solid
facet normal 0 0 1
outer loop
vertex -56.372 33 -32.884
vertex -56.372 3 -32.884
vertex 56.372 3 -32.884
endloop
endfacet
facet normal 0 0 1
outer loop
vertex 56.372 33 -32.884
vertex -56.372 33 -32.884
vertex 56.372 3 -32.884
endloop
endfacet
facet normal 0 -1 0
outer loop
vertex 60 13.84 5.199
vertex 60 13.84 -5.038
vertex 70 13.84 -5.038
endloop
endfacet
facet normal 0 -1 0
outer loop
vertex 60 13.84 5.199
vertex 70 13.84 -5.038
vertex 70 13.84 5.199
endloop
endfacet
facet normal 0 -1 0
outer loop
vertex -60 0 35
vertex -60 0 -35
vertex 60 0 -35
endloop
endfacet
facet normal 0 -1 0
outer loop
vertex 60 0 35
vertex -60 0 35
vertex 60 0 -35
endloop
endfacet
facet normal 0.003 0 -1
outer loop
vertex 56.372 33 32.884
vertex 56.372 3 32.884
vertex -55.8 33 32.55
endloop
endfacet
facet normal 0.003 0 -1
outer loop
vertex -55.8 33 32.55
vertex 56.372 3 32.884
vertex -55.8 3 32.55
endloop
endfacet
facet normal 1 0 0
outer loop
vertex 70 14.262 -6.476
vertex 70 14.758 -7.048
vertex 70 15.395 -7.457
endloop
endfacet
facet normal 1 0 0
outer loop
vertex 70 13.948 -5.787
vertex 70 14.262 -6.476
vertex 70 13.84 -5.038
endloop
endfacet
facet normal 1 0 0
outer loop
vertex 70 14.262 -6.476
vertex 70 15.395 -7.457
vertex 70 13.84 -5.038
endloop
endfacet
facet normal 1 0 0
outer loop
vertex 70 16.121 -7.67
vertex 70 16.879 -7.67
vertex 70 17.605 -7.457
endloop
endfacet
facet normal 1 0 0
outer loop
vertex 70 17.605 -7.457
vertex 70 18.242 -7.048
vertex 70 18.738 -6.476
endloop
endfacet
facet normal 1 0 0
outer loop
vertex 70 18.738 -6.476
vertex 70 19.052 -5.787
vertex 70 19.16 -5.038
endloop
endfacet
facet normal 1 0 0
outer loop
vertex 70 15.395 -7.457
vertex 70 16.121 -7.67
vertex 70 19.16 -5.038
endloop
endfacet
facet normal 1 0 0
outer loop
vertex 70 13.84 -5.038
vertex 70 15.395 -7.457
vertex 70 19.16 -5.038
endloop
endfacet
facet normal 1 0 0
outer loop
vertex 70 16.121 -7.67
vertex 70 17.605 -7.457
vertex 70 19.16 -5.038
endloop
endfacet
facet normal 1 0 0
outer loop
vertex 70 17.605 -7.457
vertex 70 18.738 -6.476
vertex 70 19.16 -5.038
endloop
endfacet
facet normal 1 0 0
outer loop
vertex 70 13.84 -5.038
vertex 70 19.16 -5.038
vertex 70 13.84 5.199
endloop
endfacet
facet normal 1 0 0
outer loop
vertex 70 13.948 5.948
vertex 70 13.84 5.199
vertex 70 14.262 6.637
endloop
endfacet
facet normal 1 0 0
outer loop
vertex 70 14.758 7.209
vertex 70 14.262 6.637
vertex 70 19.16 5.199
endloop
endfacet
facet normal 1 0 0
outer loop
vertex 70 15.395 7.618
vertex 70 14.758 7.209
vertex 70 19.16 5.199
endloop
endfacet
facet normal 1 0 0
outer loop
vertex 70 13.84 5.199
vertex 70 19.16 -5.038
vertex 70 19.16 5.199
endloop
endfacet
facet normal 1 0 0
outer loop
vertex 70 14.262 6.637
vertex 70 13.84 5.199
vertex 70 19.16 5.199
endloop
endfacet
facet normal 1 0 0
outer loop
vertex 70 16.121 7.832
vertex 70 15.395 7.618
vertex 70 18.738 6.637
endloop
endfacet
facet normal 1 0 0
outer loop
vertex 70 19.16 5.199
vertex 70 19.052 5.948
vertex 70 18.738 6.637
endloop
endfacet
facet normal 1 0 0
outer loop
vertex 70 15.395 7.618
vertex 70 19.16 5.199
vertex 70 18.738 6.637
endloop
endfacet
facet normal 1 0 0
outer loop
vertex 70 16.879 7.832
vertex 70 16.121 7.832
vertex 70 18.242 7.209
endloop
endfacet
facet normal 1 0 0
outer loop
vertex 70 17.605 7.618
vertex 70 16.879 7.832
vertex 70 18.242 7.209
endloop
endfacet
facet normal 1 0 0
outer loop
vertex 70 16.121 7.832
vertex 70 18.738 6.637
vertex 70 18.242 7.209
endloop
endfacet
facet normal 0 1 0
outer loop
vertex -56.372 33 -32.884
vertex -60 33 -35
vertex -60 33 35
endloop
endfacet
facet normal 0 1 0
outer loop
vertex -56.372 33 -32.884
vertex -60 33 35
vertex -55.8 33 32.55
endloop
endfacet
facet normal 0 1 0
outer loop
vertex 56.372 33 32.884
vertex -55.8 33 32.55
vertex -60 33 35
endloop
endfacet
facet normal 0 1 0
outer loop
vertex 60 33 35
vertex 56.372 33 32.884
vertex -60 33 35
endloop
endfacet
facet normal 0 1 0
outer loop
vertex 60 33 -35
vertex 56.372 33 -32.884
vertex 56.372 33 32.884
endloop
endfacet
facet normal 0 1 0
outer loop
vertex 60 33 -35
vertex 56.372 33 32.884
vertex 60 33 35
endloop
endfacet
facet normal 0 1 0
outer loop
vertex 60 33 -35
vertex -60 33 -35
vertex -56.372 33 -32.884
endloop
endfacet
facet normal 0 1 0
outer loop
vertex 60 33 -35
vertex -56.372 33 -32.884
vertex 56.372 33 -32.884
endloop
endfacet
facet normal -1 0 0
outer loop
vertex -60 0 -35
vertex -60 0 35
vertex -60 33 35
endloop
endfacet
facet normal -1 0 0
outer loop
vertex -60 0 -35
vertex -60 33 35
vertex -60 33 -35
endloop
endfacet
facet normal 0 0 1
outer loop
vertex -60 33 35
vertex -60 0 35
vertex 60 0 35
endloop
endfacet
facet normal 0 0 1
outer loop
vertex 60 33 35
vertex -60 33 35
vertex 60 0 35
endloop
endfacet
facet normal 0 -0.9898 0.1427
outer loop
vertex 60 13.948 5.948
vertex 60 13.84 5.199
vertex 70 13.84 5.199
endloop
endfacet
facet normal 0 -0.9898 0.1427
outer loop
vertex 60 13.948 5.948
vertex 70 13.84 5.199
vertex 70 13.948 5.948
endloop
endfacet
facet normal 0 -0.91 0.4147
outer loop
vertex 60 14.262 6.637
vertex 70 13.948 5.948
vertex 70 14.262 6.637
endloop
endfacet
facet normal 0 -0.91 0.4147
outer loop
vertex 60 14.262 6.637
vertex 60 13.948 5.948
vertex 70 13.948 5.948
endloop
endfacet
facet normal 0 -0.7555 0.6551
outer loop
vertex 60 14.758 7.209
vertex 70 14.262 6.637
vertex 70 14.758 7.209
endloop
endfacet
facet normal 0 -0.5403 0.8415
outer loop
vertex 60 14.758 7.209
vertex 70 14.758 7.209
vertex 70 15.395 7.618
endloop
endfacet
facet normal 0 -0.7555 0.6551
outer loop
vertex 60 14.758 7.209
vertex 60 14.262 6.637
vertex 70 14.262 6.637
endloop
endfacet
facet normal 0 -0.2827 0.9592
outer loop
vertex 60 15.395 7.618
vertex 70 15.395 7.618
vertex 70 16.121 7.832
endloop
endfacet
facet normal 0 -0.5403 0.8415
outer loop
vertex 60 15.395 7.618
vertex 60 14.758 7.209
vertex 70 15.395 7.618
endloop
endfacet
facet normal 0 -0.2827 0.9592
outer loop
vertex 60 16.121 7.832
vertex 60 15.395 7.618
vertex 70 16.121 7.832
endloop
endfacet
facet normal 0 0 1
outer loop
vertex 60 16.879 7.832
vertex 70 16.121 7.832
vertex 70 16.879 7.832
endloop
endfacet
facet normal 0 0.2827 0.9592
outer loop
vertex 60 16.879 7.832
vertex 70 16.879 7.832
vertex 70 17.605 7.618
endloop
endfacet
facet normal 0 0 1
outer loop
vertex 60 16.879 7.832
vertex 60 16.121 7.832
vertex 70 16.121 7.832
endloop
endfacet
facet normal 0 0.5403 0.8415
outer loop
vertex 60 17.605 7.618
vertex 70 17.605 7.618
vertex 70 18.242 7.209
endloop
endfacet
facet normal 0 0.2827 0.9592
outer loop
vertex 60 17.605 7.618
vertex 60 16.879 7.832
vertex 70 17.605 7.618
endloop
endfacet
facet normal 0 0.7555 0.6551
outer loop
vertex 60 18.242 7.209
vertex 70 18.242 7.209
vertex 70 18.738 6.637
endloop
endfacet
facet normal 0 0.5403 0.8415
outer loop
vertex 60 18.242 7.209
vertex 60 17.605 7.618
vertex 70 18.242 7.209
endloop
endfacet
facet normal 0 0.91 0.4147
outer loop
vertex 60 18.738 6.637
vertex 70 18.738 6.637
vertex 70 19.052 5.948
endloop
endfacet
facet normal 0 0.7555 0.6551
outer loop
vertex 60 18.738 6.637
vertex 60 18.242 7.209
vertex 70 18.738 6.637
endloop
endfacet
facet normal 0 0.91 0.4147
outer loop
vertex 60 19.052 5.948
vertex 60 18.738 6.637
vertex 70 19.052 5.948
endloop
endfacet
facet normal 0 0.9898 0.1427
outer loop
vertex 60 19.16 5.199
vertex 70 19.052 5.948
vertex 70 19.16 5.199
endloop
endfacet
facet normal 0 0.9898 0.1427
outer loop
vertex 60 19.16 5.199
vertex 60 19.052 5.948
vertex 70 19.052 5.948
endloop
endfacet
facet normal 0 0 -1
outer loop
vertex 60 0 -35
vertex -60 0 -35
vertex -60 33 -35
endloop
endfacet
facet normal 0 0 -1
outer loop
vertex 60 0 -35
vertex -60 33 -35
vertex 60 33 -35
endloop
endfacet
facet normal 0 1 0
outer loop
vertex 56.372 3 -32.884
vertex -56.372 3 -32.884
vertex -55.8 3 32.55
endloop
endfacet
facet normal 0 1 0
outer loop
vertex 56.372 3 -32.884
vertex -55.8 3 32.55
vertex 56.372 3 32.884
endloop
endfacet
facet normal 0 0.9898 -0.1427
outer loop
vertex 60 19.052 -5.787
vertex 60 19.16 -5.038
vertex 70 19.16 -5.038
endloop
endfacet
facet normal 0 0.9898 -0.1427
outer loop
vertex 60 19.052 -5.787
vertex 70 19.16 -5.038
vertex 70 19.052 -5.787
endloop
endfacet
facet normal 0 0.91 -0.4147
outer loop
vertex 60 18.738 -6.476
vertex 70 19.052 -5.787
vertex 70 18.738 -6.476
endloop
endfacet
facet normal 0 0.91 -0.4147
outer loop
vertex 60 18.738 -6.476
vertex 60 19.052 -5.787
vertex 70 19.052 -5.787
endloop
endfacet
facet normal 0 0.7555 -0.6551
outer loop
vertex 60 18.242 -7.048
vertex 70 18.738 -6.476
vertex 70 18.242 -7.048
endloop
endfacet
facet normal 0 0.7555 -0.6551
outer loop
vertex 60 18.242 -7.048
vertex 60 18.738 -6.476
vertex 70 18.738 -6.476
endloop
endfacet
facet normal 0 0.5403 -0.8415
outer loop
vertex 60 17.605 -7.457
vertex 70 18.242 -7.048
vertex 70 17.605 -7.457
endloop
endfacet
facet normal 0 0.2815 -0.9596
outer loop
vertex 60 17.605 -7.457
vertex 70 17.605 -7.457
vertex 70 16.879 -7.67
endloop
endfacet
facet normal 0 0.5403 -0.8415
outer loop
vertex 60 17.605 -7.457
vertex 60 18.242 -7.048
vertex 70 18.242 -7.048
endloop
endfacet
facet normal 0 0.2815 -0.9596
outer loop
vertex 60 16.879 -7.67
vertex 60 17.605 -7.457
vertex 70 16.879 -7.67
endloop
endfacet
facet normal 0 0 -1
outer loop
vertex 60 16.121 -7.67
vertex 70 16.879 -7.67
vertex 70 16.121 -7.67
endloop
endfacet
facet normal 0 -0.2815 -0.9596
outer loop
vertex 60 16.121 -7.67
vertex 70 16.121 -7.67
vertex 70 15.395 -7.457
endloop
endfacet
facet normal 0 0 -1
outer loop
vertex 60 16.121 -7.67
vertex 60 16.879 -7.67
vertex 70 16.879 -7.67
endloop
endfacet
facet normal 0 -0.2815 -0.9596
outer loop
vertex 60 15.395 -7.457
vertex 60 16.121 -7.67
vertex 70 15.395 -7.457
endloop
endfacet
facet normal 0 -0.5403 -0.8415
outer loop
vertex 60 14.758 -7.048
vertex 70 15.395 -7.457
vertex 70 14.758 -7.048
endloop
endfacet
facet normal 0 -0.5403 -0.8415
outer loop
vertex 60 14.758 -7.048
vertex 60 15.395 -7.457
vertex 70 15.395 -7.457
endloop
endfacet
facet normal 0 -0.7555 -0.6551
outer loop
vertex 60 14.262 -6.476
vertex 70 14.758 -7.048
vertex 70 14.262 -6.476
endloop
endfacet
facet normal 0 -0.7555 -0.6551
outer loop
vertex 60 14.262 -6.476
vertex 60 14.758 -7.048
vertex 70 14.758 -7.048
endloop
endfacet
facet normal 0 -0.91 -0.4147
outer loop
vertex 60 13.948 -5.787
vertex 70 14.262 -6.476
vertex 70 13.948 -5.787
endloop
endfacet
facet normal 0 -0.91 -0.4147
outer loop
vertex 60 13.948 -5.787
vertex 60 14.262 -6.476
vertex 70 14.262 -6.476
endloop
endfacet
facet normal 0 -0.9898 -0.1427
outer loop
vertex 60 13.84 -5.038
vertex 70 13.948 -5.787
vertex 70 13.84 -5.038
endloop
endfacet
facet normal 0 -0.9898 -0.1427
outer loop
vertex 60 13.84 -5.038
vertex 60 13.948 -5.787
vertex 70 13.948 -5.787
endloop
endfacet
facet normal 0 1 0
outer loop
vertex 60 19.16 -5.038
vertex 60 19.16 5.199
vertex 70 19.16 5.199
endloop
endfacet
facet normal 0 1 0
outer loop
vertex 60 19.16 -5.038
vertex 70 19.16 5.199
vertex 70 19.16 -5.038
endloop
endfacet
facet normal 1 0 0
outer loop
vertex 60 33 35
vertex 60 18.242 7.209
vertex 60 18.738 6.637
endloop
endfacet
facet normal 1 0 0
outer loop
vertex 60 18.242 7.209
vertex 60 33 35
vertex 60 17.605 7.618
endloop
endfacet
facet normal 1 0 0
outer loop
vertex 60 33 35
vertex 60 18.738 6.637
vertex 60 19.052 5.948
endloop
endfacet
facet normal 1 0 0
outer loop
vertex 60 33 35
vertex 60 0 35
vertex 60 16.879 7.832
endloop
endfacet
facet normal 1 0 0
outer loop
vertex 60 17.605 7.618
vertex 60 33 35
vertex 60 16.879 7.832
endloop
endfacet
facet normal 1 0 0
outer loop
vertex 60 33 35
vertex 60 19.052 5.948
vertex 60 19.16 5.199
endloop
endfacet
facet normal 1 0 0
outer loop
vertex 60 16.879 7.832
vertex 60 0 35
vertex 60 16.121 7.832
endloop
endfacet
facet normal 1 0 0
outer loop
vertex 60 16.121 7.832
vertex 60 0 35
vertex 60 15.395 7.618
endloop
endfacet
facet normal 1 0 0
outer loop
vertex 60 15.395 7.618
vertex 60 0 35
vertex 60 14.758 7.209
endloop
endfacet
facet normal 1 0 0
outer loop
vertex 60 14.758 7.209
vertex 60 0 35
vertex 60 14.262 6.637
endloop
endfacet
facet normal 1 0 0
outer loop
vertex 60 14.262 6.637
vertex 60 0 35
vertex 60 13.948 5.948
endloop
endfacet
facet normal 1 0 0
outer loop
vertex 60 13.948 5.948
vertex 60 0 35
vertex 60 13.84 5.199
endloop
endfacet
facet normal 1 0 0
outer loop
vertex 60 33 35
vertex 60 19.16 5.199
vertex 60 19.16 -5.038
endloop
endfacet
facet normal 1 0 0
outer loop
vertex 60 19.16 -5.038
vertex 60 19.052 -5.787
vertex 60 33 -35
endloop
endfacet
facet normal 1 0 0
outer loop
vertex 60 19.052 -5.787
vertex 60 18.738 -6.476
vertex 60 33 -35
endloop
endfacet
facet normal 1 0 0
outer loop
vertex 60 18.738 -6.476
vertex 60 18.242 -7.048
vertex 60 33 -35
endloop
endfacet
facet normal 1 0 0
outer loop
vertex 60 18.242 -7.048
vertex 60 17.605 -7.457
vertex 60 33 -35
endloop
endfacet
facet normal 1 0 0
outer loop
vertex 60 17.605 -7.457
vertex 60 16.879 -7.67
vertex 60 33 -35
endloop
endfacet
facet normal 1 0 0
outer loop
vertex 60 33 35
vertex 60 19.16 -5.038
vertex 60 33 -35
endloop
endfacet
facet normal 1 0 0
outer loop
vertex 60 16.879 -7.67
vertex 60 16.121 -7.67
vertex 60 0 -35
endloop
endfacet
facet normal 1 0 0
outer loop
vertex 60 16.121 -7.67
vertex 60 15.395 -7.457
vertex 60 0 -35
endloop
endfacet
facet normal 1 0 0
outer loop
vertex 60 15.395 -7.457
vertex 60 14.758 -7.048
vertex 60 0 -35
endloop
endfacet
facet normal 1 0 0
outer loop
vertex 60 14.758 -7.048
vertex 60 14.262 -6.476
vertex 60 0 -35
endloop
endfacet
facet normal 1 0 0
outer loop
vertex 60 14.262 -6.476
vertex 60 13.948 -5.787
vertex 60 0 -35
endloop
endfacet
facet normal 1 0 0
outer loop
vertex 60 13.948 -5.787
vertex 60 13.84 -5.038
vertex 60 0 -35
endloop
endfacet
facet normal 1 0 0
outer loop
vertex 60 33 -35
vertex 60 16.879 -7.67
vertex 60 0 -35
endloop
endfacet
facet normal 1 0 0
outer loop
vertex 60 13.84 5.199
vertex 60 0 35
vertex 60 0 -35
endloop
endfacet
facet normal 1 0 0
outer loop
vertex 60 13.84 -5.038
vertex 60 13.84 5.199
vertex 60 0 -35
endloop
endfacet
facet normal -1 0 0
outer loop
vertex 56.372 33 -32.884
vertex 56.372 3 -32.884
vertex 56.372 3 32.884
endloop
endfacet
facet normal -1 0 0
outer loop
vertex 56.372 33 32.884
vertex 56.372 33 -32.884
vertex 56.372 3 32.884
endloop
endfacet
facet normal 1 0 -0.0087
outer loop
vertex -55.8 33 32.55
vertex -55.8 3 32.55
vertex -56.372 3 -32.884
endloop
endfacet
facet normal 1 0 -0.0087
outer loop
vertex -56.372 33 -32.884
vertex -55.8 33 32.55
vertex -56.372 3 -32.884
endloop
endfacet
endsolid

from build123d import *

# Parameters (mm, degrees)
SKETCH_1_W      = 120
SKETCH_1_H      = 70
EXTRUDE_1_DEPTH = 3
SKETCH_3_W      = 120
SKETCH_3_H      = 70
EXTRUDE_2_DEPTH = 33
EXTRUDE_3_DEPTH = 10


with BuildPart() as part:
    # 草图1 → 凸台-拉伸1 (new body)
    with BuildSketch(Plane(origin=(0, 0, 0), x_dir=(1, 0, 0), z_dir=(0, 1, 0))):
        Rectangle(SKETCH_1_W, SKETCH_1_H)
    extrude(amount=EXTRUDE_1_DEPTH)

    # 草图3 → 凸台-拉伸2 (add)
    with BuildSketch(Plane(origin=(0, 0, 0), x_dir=(1, 0, 0), z_dir=(0, 1, 0))):
        Rectangle(SKETCH_3_W, SKETCH_3_H)
        Polygon((-56.372128616, 32.883741693), (56.372128616, 32.883741693), (56.372128616, -32.883741693), (-55.8, -32.55), align=None, mode=Mode.SUBTRACT)
    extrude(amount=EXTRUDE_2_DEPTH)

    # 草图4 → 凸台-拉伸3 (add)
    with BuildSketch(Plane(origin=(60, 0, 0), x_dir=(0, 0, -1), z_dir=(1, 0, 0))):
        with BuildLine():
            Line((-5.198866843, 19.159885362), (5.03766167, 19.159885362))
            ThreePointArc((5.03766167, 19.159885362), (7.697547031, 16.5), (5.03766167, 13.840114638))
            Line((5.03766167, 13.840114638), (-5.198866843, 13.840114638))
            ThreePointArc((-5.198866843, 13.840114638), (-7.858752205, 16.5), (-5.198866843, 19.159885362))
        make_face()
    extrude(amount=EXTRUDE_3_DEPTH)


solid = part.part
